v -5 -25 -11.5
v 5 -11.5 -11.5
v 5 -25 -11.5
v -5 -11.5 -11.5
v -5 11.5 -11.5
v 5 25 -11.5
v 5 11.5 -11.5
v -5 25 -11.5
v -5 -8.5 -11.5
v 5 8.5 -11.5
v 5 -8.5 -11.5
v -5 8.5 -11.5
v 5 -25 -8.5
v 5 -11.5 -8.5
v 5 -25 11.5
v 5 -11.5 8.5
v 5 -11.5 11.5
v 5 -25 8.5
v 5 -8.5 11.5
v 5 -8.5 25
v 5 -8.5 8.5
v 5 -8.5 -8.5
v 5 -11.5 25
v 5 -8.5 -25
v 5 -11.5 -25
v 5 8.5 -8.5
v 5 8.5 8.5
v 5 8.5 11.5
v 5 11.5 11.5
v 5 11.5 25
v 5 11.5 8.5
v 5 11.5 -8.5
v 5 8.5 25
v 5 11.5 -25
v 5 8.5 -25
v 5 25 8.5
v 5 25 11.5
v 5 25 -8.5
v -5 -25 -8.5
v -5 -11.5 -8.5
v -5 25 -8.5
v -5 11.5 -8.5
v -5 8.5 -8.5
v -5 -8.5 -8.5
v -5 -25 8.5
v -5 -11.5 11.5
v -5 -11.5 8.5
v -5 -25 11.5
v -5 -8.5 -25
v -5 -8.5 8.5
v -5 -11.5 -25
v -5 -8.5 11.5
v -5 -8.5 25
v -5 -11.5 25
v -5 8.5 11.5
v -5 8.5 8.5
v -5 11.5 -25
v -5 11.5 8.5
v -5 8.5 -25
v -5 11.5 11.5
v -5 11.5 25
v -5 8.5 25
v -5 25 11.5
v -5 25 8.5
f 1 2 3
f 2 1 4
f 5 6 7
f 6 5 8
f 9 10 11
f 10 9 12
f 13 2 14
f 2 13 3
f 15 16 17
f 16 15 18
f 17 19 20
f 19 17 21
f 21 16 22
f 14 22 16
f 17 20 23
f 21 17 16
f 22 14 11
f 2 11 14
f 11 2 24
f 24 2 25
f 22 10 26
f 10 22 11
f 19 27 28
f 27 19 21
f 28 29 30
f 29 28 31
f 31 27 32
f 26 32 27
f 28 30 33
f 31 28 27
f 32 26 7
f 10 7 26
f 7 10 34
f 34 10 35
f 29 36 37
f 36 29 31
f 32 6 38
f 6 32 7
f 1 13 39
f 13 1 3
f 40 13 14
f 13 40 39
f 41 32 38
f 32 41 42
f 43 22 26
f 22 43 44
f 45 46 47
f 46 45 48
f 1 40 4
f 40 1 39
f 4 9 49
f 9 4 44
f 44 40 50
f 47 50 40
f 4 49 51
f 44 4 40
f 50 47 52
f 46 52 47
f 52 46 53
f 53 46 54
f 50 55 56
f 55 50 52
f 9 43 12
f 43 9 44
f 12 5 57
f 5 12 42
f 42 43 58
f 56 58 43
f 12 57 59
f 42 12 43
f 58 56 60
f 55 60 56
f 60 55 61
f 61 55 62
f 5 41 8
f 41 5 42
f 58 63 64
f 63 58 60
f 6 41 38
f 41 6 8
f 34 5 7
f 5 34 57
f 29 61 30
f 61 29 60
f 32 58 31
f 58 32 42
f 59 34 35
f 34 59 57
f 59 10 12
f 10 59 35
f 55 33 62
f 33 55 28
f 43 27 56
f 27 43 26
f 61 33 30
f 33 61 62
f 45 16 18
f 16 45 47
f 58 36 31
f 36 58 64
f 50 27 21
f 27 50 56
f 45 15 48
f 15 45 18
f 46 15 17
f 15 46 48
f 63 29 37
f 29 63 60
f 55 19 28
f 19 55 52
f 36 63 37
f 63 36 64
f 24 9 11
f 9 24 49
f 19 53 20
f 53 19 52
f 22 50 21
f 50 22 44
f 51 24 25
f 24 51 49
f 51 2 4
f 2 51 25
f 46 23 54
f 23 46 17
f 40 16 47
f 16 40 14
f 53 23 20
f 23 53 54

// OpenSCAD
union()
{
    union()
    {
        translate([0.0, 0.0, -10.0])
        {
            linear_extrude(height = 3.0, twist = 0.0, scale = 1.0, slices = 1, center = true)
            {
                scale([10.0, 50.0])
                {
                    M8();
                }
            }
        }
        translate([0.0, 10.0, 0.0])
        {
            rotate([90.0, 0.0, 0.0])
            {
                linear_extrude(height = 3.0, twist = 0.0, scale = 1.0, slices = 1, center = true)
                {
                    scale([10.0, 50.0])
                    {
                        M8();
                    }
                }
            }
        }
    }
    union()
    {
        translate([0.0, 0.0, 10.0])
        {
            linear_extrude(height = 3.0, twist = 0.0, scale = 1.0, slices = 1, center = true)
            {
                scale([10.0, 50.0])
                {
                    M8();
                }
            }
        }
        translate([0.0, -10.0, 0.0])
        {
            rotate([90.0, 0.0, 0.0])
            {
                linear_extrude(height = 3.0, twist = 0.0, scale = 1.0, slices = 1, center = true)
                {
                    scale([10.0, 50.0])
                    {
                        M8();
                    }
                }
            }
        }
    }
}

module M8()
{
    polygon
    (
        points =
        [
            [-0.5, -0.5], 
            [0.5, -0.5], 
            [0.5, 0.5], 
            [-0.5, 0.5]
        ],
        paths =
        [
            [0, 1, 2, 3]
        ]
    );
}
